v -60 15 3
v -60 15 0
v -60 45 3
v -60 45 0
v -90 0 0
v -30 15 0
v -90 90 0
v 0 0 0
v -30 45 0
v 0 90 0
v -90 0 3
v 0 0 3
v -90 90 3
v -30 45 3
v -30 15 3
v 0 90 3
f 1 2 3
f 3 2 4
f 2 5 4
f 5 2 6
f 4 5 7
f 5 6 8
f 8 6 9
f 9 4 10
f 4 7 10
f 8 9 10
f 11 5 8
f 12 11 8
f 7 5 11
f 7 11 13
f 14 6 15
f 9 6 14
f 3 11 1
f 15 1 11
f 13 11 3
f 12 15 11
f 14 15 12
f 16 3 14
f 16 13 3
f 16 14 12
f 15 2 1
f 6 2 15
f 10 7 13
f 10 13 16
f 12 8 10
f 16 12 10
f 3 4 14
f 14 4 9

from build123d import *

# Parameters (mm, degrees)
SKETCH_W     = 90
SKETCH_H     = 90
PAD_DEPTH    = 3
SKETCH001_W  = 30
SKETCH001_H  = 30
POCKET_DEPTH = 3


with BuildPart() as part:
    # Sketch → Pad (new body)
    with BuildSketch(Plane.XY):
        with Locations((-45, 45)):
            Rectangle(SKETCH_W, SKETCH_H)
    extrude(amount=PAD_DEPTH)

    # Sketch001 → Pocket (cut)
    with BuildSketch(Plane.XY):
        with Locations((-45, 30)):
            Rectangle(SKETCH001_W, SKETCH001_H)
    extrude(amount=POCKET_DEPTH, mode=Mode.SUBTRACT)


solid = part.part
